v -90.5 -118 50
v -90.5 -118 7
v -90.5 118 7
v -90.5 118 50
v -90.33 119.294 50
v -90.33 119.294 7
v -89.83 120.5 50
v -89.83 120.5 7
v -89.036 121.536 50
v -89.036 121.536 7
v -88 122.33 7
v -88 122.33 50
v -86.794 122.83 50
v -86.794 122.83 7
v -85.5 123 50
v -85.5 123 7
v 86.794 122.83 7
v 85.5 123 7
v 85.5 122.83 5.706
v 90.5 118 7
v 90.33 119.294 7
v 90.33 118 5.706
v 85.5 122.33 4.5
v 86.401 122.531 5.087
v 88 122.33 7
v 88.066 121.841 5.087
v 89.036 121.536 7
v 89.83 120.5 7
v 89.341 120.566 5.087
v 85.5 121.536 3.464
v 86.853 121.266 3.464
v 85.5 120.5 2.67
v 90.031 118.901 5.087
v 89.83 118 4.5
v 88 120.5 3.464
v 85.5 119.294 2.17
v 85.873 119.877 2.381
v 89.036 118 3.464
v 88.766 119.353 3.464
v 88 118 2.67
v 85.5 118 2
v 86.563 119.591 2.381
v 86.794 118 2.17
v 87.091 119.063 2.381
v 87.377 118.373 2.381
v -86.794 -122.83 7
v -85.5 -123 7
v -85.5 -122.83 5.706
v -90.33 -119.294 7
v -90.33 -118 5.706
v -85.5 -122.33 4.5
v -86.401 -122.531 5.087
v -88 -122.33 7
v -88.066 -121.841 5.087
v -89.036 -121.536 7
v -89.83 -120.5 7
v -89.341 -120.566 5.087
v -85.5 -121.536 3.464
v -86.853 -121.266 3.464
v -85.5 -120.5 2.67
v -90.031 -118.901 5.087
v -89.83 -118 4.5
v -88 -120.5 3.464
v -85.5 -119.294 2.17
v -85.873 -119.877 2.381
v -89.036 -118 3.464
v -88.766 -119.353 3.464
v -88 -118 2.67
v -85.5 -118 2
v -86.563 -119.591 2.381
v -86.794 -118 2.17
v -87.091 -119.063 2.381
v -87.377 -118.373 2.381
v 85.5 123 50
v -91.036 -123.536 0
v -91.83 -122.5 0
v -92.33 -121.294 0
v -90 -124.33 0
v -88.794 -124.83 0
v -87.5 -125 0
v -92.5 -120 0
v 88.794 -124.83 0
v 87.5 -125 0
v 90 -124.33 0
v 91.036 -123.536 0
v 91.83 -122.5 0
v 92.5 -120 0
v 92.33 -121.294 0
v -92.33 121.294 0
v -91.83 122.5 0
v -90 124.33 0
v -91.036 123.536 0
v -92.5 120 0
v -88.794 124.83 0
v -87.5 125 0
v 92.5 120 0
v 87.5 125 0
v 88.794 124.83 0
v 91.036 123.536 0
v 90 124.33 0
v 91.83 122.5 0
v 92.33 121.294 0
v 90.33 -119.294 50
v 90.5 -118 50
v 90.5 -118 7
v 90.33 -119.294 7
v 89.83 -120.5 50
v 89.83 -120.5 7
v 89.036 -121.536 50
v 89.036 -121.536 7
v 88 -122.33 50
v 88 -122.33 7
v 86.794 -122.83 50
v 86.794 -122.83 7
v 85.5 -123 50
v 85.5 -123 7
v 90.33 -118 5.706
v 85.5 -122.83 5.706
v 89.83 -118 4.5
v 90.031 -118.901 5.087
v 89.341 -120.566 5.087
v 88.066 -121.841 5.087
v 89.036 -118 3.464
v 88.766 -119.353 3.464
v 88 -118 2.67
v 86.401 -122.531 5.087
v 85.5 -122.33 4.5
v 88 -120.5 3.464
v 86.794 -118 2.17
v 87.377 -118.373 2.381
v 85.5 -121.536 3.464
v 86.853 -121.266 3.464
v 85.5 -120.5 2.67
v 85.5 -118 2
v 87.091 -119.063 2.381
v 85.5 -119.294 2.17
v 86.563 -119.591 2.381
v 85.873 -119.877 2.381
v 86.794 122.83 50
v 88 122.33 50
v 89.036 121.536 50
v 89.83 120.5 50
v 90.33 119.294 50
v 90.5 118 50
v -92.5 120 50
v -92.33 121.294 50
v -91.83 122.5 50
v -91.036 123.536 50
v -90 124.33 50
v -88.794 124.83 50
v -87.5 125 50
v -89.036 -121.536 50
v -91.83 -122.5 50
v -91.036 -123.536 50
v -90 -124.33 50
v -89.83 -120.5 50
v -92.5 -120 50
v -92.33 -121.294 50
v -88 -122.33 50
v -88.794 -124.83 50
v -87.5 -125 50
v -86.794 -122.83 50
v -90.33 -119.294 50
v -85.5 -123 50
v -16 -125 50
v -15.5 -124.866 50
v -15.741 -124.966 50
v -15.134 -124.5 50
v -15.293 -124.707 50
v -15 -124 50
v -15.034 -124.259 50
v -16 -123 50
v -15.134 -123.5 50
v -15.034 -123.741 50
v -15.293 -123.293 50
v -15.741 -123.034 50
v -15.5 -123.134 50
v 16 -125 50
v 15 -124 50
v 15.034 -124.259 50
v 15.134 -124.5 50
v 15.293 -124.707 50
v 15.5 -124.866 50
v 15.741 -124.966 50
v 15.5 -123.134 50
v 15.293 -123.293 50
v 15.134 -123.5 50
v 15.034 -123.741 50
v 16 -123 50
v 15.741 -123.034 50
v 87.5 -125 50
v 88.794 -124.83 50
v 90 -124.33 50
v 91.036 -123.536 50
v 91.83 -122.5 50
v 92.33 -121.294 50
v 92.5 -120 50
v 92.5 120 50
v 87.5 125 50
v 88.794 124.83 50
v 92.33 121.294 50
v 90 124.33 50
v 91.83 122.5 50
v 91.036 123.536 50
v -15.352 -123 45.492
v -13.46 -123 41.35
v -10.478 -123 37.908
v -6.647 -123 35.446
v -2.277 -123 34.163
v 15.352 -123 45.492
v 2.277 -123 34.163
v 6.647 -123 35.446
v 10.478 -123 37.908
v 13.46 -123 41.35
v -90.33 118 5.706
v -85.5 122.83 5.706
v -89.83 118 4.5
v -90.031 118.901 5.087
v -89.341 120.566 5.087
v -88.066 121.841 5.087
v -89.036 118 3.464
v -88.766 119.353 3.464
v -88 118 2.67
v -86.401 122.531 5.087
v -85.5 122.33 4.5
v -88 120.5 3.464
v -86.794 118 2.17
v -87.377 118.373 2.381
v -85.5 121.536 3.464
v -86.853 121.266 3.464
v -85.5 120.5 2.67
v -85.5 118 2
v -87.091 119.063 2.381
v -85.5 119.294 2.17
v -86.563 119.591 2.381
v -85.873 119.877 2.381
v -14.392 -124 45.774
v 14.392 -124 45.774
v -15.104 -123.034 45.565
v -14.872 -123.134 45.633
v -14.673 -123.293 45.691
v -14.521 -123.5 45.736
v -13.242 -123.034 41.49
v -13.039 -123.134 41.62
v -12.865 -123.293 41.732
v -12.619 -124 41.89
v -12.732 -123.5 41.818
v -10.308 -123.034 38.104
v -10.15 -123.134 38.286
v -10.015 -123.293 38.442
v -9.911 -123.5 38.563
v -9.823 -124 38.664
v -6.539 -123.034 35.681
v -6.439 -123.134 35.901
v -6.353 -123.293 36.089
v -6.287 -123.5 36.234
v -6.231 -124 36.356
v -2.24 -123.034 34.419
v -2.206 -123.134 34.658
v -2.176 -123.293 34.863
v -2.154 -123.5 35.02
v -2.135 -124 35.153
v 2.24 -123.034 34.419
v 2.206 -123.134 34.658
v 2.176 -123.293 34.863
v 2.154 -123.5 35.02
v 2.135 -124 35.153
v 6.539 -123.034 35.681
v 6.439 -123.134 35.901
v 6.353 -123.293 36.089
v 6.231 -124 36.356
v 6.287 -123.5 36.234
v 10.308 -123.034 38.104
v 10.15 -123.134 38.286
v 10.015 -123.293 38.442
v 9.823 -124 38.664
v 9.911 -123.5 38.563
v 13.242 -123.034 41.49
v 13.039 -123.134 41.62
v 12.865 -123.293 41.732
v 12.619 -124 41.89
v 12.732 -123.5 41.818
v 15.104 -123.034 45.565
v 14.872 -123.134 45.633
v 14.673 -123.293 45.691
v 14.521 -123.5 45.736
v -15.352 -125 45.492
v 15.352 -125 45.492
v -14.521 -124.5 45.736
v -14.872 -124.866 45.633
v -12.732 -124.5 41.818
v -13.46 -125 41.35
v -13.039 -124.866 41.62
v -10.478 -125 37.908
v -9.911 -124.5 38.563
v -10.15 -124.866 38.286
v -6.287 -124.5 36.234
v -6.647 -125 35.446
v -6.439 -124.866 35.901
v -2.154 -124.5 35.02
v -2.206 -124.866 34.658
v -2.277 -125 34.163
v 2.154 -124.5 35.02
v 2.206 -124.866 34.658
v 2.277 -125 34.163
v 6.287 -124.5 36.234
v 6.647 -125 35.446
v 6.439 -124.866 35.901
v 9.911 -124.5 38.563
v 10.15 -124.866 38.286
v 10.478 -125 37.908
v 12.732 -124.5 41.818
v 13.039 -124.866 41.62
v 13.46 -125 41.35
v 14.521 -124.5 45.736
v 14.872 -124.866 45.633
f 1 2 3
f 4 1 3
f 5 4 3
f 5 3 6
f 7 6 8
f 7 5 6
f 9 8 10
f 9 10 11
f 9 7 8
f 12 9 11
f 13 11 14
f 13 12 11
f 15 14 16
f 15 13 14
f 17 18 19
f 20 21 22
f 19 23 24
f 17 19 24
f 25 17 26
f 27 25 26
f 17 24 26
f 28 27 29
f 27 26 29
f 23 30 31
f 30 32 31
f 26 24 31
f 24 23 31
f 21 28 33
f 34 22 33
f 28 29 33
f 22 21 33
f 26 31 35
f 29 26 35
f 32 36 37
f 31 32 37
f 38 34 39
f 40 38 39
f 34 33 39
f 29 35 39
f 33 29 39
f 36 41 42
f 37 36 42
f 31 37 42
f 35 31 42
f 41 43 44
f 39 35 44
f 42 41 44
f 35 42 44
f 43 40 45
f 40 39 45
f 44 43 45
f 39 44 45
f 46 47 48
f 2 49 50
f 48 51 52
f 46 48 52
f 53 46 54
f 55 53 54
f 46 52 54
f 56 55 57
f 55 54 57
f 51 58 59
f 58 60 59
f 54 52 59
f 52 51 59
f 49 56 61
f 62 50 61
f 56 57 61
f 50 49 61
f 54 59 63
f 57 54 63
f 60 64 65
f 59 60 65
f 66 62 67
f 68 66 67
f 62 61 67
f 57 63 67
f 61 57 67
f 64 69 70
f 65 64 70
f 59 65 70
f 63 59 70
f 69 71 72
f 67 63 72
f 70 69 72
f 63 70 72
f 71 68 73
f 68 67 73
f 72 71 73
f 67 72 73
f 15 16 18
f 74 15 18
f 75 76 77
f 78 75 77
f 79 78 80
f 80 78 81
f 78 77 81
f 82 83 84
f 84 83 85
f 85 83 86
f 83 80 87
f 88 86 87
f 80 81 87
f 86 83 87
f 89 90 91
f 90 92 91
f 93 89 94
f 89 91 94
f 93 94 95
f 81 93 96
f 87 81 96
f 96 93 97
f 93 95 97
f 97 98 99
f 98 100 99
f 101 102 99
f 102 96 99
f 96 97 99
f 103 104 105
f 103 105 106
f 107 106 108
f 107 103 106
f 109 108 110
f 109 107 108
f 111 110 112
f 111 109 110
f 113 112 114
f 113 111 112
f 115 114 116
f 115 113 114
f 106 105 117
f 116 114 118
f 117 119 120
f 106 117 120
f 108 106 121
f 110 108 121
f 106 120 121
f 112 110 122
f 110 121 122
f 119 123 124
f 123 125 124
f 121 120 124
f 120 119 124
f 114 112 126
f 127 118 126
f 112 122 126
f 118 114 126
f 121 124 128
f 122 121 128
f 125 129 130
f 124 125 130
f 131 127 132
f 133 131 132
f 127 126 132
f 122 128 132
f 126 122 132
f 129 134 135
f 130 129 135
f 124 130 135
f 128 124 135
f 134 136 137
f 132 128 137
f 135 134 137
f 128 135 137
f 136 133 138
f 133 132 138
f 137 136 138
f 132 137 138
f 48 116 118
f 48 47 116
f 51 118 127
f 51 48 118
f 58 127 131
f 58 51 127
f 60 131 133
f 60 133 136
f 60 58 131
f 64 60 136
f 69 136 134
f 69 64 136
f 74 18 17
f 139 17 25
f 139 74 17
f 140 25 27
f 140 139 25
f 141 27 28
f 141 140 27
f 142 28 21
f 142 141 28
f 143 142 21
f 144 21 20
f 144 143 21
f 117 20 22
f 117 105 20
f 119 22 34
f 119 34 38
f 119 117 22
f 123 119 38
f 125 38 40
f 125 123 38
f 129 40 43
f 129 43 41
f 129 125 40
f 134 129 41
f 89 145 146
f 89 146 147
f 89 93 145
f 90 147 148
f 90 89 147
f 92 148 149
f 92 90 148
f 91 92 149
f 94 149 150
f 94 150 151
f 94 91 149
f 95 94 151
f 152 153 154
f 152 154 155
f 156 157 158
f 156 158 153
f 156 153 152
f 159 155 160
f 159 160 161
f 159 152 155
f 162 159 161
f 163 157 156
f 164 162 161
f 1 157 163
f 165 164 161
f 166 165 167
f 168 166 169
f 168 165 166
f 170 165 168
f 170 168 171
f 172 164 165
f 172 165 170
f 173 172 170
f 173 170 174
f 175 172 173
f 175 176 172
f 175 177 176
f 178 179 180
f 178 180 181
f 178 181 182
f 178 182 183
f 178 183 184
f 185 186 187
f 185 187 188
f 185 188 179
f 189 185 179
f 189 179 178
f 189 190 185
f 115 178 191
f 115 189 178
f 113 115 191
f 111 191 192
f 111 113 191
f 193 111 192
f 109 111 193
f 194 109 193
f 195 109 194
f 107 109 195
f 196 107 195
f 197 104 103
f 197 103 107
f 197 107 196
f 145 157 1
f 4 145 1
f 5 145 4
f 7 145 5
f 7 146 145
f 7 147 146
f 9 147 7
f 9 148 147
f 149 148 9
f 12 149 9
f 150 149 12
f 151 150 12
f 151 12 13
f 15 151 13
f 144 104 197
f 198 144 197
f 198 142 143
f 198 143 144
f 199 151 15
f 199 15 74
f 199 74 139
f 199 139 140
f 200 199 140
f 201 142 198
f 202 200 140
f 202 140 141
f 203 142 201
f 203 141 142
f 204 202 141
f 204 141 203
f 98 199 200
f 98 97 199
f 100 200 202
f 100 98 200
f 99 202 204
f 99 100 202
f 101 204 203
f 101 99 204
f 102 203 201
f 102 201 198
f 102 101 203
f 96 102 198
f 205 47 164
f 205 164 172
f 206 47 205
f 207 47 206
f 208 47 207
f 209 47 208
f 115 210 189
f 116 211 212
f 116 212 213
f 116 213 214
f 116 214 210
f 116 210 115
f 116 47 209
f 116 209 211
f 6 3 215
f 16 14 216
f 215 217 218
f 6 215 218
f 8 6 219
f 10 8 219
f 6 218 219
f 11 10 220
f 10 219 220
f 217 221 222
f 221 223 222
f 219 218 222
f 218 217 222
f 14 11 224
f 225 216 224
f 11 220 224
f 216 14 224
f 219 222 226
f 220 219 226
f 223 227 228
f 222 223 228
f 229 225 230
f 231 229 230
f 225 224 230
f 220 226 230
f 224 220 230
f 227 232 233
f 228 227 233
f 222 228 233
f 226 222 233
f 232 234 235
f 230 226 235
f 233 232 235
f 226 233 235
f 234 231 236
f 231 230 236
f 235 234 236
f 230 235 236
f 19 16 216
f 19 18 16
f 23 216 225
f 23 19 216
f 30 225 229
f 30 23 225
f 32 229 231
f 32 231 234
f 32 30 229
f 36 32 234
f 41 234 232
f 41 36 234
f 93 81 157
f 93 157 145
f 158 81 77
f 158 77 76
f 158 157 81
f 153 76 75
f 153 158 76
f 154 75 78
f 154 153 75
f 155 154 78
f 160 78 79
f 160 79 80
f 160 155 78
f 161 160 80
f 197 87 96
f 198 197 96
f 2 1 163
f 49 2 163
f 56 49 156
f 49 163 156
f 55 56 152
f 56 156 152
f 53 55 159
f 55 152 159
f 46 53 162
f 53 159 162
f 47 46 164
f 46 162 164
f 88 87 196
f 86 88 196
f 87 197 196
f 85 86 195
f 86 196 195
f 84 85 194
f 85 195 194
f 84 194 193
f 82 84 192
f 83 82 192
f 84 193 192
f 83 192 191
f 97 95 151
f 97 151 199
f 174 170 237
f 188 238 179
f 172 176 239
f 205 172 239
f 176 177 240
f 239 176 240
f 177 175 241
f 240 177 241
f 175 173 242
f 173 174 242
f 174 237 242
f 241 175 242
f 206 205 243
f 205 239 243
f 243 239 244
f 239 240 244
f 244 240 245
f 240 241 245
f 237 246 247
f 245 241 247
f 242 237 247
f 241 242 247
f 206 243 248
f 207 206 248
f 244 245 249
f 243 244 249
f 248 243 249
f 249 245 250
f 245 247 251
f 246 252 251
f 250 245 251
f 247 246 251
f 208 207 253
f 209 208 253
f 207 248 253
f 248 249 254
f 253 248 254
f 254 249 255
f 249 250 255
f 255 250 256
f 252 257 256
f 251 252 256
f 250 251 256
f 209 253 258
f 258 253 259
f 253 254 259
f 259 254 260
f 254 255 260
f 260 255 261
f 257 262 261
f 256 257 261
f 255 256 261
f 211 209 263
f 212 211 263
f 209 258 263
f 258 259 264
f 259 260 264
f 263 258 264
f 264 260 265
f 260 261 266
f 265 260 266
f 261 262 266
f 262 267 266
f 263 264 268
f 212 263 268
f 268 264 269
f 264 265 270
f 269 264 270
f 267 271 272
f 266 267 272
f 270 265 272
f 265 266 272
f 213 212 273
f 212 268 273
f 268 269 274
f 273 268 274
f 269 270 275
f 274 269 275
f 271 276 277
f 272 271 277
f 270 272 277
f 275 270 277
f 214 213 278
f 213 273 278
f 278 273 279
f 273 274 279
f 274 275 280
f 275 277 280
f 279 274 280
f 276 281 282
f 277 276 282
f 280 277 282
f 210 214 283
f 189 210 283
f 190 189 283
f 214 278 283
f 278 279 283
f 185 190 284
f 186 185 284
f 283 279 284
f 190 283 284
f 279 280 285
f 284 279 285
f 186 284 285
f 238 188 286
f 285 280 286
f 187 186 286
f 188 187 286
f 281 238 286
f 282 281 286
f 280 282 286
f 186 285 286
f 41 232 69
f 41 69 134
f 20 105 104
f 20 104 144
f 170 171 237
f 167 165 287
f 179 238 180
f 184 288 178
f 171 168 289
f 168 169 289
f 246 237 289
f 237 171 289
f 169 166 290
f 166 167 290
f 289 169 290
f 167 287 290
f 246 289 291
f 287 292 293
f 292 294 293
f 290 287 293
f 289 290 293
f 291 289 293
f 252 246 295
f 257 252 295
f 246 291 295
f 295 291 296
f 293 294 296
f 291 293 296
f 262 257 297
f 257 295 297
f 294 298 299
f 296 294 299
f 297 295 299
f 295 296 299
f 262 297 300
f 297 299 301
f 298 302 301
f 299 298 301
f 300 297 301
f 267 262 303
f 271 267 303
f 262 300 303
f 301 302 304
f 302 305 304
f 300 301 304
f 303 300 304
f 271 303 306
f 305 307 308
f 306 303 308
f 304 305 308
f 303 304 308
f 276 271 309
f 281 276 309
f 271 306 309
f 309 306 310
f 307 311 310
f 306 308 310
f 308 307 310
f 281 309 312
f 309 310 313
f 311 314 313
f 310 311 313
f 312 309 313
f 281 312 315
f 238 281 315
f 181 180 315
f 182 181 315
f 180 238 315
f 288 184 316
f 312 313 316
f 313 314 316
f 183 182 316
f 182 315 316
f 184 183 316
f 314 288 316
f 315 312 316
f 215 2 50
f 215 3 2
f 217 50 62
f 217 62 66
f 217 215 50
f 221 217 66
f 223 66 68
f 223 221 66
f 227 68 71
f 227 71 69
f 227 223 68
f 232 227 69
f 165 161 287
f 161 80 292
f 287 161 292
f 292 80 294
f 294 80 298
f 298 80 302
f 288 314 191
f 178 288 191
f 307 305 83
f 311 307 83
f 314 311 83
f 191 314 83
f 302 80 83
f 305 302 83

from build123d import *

# Parameters (mm, degrees)
F0_W     = 185
F0_H     = 250
F0_W_2   = 181
F0_H_2   = 246
F1_DEPTH = 50
F2_DEPTH = 2
F3_R     = 5
F4_R     = 5
F5_R     = 15
F6_DEPTH = 25
F7_R     = 0.99999


# Not quite as in the source:
# - a fillet or chamfer is up to 0.001 mm smaller than in the source, because OpenCascade refuses the exact size


with BuildPart() as f1:
    # F0 (on Top) → F1 (new body)
    with BuildSketch(Plane.XY):
        Rectangle(F0_W, F0_H)
        Rectangle(F0_W_2, F0_H_2, mode=Mode.SUBTRACT)
    extrude(amount=F1_DEPTH)

    # F0 (on Top) → F2 (join)
    with BuildSketch(Plane.XY):
        Rectangle(F0_W, F0_H)
        Rectangle(F0_W_2, F0_H_2, mode=Mode.SUBTRACT)
        Rectangle(F0_W_2, F0_H_2)
    extrude(amount=F2_DEPTH)

    # F3
    f3_edges = [f1.edges().sort_by_distance(p)[0] for p in [
        (92.5, 125, 25),
        (-92.5, 125, 25),
        (90.5, 123, 26),
        (-90.5, 123, 26),
        (-90.5, -123, 26),
        (-92.5, -125, 25),
        (92.5, -125, 25),
        (90.5, -123, 26),
    ]]
    fillet(f3_edges, radius=F3_R)

    # F4
    f4_edges = [f1.edges().sort_by_distance(p)[0] for p in [
        (-90.5, 0, 2),
        (-89.035534, -121.535534, 2),
        (-89.035534, 121.535534, 2),
        (0, -123, 2),
        (0, 123, 2),
        (89.035534, -121.535534, 2),
        (89.035534, 121.535534, 2),
        (90.5, 0, 2),
    ]]
    fillet(f4_edges, radius=F4_R)

    # F5 (on face) → F6 (cut)
    with BuildSketch(Plane.XZ.offset(125)):
        with Locations((0, 50)):
            Circle(F5_R)
    extrude(amount=-F6_DEPTH, mode=Mode.SUBTRACT)

    # F7 (radius 1 in the source; OpenCascade refuses exactly that, so slightly less here)
    f7_edges = [f1.edges().sort_by_distance(p)[0] for p in [
        (0, -123, 35),
        (0, -125, 35),
    ]]
    fillet(f7_edges, radius=F7_R)


solid = f1.part
